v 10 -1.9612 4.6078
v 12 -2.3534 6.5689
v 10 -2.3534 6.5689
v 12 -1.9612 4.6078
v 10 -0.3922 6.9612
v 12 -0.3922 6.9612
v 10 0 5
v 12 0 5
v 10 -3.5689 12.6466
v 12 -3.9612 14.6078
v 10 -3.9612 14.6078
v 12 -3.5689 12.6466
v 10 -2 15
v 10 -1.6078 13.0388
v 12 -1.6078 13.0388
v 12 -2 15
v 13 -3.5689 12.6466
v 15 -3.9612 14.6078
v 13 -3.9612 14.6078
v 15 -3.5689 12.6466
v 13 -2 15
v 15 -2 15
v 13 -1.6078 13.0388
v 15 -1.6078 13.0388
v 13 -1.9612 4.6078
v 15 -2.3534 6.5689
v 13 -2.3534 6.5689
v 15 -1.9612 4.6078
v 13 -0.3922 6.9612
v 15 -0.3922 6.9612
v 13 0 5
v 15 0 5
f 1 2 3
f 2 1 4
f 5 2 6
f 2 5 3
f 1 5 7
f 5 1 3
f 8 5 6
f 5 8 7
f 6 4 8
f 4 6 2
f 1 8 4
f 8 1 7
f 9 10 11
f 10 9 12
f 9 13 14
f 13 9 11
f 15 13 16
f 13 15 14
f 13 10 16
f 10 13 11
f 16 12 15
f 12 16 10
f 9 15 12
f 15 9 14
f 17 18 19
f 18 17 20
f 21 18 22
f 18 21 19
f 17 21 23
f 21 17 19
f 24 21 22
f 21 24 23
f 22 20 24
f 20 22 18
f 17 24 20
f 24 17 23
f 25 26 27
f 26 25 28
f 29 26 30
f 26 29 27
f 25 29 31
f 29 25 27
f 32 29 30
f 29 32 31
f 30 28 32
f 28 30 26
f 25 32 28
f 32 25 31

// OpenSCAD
$fn=7;
union()
{
	translate([10,0,5])
	{
		rotate(101.30993,[1,0,0])
		{
			cube([2,2,2]);
		}
	}
	translate([10,-1.607768,13.038838])
	{
		rotate(101.30993,[1,0,0])
		{
			cube([2,2,2]);
		}
	}
	translate([13,-1.607768,13.038838])
	{
		rotate(101.30993,[1,0,0])
		{
			cube([2,2,2]);
		}
	}
	translate([13,0,5])
	{
		rotate(101.30993,[1,0,0])
		{
			cube([2,2,2]);
		}
	}
}
